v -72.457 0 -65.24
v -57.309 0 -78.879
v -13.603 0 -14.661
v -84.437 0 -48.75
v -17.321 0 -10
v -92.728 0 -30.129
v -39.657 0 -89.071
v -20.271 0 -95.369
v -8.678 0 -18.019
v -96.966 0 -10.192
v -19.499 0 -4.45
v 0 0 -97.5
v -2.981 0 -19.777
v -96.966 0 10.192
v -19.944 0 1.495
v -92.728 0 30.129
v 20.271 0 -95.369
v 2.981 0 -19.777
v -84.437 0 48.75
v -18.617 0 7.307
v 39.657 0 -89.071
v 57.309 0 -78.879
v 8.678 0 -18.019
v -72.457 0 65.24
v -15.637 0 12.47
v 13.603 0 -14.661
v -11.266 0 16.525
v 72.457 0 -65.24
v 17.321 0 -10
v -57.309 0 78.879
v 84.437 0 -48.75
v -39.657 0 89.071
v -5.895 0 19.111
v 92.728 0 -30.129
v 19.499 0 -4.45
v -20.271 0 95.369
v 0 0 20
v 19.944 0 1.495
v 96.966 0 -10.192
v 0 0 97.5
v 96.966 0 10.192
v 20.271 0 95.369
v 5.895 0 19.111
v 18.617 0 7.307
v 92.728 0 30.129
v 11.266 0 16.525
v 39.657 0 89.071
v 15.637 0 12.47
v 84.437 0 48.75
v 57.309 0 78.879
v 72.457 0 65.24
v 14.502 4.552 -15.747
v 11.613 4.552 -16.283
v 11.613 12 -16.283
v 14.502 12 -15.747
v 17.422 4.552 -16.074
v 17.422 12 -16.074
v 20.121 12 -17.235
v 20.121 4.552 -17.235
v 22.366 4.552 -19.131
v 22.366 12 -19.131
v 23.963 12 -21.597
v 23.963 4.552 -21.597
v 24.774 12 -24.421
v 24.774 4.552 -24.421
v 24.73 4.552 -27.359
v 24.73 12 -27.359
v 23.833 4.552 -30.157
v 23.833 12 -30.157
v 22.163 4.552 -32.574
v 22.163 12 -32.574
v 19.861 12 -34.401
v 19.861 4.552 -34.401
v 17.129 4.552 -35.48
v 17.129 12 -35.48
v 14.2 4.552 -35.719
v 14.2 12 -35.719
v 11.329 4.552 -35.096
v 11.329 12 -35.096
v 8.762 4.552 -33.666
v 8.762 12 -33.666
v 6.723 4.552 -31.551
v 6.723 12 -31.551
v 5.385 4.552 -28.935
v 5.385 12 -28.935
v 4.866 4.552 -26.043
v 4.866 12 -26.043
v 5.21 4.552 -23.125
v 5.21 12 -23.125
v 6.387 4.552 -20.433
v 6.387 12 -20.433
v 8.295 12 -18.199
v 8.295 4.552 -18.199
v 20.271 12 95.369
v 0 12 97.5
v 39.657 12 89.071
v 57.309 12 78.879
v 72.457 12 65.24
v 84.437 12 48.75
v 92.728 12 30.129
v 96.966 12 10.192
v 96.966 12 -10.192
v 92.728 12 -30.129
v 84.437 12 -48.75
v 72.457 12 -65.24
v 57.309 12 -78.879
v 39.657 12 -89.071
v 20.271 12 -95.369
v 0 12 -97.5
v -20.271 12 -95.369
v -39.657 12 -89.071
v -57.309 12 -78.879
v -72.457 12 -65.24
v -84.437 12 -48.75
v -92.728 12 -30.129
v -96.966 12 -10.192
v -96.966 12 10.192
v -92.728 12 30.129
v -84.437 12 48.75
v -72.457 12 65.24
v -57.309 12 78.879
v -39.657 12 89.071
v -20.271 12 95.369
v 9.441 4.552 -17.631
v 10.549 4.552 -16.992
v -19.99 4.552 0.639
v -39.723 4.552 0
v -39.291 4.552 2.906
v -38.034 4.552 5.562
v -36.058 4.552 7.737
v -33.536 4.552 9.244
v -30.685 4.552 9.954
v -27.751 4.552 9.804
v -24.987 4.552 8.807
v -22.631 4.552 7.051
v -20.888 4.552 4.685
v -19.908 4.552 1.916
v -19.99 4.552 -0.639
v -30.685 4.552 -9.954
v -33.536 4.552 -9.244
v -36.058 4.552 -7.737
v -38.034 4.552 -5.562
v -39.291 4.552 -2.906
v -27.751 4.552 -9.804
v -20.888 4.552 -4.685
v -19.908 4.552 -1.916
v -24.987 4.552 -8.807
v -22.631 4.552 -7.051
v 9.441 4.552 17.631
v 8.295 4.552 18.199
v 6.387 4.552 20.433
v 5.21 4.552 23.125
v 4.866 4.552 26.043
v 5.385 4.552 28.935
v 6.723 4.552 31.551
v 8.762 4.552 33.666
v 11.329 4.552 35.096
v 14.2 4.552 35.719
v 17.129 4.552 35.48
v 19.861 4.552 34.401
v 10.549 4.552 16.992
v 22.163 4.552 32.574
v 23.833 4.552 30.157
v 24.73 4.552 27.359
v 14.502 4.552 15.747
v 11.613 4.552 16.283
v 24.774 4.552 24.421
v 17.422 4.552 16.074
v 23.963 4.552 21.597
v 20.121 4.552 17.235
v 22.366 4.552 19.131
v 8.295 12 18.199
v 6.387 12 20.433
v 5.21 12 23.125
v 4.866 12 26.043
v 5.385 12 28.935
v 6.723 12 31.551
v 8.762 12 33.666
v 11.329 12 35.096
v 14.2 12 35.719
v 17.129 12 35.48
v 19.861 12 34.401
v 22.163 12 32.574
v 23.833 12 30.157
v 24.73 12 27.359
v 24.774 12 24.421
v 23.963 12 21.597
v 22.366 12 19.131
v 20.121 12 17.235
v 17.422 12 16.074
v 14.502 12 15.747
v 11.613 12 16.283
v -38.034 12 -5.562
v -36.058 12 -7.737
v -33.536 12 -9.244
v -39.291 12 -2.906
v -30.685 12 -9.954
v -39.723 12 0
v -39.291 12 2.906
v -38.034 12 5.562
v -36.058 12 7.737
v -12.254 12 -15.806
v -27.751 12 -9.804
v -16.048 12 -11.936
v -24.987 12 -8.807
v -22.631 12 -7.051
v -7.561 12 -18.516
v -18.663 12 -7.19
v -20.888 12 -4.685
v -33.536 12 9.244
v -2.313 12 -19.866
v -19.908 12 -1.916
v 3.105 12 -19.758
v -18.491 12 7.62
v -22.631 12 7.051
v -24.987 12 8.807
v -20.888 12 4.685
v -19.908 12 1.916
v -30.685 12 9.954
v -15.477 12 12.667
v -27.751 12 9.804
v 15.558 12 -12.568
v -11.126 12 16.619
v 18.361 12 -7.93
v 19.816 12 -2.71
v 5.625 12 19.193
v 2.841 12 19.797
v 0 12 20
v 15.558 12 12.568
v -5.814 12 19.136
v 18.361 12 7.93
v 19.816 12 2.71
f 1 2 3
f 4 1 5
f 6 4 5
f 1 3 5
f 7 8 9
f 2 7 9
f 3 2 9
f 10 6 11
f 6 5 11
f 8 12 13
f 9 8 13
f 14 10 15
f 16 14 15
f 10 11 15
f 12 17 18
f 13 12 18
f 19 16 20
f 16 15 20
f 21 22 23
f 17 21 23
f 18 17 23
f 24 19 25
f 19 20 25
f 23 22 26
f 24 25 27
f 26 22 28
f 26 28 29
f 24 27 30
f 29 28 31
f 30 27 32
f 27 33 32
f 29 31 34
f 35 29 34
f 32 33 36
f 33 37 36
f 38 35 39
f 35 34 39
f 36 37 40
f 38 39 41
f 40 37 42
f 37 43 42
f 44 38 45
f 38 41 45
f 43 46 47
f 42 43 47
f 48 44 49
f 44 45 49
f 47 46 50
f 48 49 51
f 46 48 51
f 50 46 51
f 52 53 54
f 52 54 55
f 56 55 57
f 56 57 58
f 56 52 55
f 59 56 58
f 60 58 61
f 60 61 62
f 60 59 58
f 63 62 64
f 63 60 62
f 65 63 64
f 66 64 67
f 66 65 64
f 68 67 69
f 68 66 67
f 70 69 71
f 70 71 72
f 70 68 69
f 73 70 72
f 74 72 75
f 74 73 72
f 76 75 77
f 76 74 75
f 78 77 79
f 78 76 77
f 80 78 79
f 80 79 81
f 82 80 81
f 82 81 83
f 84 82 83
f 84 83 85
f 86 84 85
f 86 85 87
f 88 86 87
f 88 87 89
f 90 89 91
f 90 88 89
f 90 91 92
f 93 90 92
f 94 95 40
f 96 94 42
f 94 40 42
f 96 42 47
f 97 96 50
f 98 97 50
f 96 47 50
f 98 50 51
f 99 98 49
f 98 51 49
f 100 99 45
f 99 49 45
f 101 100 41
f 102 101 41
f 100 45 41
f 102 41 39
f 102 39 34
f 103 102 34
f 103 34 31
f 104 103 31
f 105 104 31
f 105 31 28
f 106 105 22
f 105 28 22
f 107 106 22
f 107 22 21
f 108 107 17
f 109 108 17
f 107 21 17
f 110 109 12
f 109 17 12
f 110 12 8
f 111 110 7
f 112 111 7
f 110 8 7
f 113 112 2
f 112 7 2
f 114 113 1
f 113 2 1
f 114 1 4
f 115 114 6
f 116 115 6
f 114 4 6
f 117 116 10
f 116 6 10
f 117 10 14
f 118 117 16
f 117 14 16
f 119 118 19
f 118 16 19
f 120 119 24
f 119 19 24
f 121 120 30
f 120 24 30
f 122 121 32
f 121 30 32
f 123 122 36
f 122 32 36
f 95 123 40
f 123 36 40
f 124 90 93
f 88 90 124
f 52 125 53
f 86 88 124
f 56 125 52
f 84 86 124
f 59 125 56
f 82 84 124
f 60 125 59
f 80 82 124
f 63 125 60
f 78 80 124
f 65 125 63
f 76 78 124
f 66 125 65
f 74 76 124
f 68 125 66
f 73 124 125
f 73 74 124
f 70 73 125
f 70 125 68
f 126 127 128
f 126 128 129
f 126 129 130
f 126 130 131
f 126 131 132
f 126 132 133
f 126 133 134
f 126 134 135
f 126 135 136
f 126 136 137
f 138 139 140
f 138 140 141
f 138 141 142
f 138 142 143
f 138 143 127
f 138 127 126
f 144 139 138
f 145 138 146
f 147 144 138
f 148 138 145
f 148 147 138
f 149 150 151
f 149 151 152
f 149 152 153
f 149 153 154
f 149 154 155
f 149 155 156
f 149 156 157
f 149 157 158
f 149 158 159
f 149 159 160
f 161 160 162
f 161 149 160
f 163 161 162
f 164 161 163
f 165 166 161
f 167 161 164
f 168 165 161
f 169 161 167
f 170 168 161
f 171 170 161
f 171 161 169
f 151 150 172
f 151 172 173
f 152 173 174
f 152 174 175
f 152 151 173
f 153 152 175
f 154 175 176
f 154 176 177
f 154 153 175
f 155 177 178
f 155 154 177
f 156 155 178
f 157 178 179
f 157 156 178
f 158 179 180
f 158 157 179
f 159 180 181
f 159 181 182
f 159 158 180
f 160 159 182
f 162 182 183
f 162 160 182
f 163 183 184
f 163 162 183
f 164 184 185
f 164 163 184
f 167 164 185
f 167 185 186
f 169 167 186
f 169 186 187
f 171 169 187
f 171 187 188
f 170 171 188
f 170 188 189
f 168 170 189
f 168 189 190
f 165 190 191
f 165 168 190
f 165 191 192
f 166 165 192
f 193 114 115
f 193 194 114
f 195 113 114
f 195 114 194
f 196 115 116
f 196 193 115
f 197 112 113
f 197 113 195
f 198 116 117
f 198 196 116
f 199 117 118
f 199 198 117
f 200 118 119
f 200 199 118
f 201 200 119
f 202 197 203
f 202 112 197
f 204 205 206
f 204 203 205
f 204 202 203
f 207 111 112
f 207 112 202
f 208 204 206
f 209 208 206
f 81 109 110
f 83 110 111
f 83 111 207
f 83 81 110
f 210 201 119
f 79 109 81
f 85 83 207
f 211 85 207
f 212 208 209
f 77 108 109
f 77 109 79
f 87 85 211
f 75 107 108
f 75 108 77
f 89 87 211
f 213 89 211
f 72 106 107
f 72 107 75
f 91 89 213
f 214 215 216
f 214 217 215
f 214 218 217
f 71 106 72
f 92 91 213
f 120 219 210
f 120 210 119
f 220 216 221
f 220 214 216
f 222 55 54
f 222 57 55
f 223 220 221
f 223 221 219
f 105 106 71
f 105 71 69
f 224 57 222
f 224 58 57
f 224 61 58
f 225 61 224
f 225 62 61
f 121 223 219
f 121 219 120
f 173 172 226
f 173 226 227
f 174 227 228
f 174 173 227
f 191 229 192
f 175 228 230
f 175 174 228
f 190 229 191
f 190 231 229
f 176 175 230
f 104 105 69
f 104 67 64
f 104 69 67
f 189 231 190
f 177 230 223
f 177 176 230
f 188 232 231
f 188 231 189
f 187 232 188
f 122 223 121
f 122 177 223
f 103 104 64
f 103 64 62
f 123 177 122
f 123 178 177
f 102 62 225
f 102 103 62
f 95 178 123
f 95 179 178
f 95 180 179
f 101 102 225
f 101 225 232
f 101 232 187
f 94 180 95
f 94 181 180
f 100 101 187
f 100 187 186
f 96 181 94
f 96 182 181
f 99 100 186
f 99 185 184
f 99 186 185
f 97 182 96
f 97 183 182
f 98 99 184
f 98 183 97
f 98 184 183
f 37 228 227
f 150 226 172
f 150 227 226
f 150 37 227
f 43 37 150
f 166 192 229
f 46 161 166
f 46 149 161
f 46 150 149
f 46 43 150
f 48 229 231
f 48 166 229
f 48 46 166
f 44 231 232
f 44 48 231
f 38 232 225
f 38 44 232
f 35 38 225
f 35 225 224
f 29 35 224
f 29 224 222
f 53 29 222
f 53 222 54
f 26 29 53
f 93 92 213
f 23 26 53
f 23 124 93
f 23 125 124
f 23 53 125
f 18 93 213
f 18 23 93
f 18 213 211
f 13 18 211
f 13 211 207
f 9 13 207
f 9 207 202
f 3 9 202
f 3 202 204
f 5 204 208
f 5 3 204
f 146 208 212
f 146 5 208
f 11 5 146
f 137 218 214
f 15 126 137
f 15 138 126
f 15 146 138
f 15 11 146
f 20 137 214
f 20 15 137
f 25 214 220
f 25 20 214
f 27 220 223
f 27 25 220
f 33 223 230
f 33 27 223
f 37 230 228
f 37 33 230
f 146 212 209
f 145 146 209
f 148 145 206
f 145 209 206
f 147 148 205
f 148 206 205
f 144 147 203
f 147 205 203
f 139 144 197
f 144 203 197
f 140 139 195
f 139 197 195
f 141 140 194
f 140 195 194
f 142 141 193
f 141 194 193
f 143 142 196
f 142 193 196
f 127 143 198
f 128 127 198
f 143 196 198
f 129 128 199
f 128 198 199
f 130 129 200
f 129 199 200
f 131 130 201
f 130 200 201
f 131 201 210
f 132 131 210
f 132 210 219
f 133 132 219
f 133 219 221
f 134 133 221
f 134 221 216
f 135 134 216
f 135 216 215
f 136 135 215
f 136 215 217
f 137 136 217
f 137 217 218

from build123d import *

# Parameters (mm, degrees)
SKETCH1_R           = 97.5
BOSS_EXTRUDE1_DEPTH = 12
SKETCH2_R           = 20
CUT_EXTRUDE1_DEPTH  = 139.407008493
SKETCH3_R           = 10
CUT_EXTRUDE2_DEPTH  = 7.448022219
CIRPATTERN1_COUNT   = 3


with BuildPart() as part:
    # Sketch1 → Boss-Extrude1 (new body)
    with BuildSketch(Plane(origin=(0, 0, 0), x_dir=(1, 0, 0), z_dir=(0, 1, 0))):
        Circle(SKETCH1_R)
    extrude(amount=BOSS_EXTRUDE1_DEPTH)

    # Sketch2 → Cut-Extrude1 (cut, through all)
    with BuildSketch(Plane(origin=(0, 0, 0), x_dir=(1, 0, 0), z_dir=(0, 1, 0))):
        Circle(SKETCH2_R)
    extrude(amount=CUT_EXTRUDE1_DEPTH, mode=Mode.SUBTRACT)

    # Sketch3 → Cut-Extrude2 (cut)
    with BuildSketch(Plane(origin=(0, 12, 0), x_dir=(1, 0, 0), z_dir=(0, 1, 0))):
        with Locations((-29.72284232, 0)):
            Circle(SKETCH3_R)
    cut_extrude2 = extrude(amount=-CUT_EXTRUDE2_DEPTH, mode=Mode.SUBTRACT)

    # CirPattern1: Cut-Extrude2 ×3 about axis
    cirpattern1_axis = Axis((0, 0, 0), (0, 1, 0))
    for i in range(1, CIRPATTERN1_COUNT):
        add(cut_extrude2.rotate(cirpattern1_axis, i * 360 / CIRPATTERN1_COUNT), mode=Mode.SUBTRACT)


solid = part.part
